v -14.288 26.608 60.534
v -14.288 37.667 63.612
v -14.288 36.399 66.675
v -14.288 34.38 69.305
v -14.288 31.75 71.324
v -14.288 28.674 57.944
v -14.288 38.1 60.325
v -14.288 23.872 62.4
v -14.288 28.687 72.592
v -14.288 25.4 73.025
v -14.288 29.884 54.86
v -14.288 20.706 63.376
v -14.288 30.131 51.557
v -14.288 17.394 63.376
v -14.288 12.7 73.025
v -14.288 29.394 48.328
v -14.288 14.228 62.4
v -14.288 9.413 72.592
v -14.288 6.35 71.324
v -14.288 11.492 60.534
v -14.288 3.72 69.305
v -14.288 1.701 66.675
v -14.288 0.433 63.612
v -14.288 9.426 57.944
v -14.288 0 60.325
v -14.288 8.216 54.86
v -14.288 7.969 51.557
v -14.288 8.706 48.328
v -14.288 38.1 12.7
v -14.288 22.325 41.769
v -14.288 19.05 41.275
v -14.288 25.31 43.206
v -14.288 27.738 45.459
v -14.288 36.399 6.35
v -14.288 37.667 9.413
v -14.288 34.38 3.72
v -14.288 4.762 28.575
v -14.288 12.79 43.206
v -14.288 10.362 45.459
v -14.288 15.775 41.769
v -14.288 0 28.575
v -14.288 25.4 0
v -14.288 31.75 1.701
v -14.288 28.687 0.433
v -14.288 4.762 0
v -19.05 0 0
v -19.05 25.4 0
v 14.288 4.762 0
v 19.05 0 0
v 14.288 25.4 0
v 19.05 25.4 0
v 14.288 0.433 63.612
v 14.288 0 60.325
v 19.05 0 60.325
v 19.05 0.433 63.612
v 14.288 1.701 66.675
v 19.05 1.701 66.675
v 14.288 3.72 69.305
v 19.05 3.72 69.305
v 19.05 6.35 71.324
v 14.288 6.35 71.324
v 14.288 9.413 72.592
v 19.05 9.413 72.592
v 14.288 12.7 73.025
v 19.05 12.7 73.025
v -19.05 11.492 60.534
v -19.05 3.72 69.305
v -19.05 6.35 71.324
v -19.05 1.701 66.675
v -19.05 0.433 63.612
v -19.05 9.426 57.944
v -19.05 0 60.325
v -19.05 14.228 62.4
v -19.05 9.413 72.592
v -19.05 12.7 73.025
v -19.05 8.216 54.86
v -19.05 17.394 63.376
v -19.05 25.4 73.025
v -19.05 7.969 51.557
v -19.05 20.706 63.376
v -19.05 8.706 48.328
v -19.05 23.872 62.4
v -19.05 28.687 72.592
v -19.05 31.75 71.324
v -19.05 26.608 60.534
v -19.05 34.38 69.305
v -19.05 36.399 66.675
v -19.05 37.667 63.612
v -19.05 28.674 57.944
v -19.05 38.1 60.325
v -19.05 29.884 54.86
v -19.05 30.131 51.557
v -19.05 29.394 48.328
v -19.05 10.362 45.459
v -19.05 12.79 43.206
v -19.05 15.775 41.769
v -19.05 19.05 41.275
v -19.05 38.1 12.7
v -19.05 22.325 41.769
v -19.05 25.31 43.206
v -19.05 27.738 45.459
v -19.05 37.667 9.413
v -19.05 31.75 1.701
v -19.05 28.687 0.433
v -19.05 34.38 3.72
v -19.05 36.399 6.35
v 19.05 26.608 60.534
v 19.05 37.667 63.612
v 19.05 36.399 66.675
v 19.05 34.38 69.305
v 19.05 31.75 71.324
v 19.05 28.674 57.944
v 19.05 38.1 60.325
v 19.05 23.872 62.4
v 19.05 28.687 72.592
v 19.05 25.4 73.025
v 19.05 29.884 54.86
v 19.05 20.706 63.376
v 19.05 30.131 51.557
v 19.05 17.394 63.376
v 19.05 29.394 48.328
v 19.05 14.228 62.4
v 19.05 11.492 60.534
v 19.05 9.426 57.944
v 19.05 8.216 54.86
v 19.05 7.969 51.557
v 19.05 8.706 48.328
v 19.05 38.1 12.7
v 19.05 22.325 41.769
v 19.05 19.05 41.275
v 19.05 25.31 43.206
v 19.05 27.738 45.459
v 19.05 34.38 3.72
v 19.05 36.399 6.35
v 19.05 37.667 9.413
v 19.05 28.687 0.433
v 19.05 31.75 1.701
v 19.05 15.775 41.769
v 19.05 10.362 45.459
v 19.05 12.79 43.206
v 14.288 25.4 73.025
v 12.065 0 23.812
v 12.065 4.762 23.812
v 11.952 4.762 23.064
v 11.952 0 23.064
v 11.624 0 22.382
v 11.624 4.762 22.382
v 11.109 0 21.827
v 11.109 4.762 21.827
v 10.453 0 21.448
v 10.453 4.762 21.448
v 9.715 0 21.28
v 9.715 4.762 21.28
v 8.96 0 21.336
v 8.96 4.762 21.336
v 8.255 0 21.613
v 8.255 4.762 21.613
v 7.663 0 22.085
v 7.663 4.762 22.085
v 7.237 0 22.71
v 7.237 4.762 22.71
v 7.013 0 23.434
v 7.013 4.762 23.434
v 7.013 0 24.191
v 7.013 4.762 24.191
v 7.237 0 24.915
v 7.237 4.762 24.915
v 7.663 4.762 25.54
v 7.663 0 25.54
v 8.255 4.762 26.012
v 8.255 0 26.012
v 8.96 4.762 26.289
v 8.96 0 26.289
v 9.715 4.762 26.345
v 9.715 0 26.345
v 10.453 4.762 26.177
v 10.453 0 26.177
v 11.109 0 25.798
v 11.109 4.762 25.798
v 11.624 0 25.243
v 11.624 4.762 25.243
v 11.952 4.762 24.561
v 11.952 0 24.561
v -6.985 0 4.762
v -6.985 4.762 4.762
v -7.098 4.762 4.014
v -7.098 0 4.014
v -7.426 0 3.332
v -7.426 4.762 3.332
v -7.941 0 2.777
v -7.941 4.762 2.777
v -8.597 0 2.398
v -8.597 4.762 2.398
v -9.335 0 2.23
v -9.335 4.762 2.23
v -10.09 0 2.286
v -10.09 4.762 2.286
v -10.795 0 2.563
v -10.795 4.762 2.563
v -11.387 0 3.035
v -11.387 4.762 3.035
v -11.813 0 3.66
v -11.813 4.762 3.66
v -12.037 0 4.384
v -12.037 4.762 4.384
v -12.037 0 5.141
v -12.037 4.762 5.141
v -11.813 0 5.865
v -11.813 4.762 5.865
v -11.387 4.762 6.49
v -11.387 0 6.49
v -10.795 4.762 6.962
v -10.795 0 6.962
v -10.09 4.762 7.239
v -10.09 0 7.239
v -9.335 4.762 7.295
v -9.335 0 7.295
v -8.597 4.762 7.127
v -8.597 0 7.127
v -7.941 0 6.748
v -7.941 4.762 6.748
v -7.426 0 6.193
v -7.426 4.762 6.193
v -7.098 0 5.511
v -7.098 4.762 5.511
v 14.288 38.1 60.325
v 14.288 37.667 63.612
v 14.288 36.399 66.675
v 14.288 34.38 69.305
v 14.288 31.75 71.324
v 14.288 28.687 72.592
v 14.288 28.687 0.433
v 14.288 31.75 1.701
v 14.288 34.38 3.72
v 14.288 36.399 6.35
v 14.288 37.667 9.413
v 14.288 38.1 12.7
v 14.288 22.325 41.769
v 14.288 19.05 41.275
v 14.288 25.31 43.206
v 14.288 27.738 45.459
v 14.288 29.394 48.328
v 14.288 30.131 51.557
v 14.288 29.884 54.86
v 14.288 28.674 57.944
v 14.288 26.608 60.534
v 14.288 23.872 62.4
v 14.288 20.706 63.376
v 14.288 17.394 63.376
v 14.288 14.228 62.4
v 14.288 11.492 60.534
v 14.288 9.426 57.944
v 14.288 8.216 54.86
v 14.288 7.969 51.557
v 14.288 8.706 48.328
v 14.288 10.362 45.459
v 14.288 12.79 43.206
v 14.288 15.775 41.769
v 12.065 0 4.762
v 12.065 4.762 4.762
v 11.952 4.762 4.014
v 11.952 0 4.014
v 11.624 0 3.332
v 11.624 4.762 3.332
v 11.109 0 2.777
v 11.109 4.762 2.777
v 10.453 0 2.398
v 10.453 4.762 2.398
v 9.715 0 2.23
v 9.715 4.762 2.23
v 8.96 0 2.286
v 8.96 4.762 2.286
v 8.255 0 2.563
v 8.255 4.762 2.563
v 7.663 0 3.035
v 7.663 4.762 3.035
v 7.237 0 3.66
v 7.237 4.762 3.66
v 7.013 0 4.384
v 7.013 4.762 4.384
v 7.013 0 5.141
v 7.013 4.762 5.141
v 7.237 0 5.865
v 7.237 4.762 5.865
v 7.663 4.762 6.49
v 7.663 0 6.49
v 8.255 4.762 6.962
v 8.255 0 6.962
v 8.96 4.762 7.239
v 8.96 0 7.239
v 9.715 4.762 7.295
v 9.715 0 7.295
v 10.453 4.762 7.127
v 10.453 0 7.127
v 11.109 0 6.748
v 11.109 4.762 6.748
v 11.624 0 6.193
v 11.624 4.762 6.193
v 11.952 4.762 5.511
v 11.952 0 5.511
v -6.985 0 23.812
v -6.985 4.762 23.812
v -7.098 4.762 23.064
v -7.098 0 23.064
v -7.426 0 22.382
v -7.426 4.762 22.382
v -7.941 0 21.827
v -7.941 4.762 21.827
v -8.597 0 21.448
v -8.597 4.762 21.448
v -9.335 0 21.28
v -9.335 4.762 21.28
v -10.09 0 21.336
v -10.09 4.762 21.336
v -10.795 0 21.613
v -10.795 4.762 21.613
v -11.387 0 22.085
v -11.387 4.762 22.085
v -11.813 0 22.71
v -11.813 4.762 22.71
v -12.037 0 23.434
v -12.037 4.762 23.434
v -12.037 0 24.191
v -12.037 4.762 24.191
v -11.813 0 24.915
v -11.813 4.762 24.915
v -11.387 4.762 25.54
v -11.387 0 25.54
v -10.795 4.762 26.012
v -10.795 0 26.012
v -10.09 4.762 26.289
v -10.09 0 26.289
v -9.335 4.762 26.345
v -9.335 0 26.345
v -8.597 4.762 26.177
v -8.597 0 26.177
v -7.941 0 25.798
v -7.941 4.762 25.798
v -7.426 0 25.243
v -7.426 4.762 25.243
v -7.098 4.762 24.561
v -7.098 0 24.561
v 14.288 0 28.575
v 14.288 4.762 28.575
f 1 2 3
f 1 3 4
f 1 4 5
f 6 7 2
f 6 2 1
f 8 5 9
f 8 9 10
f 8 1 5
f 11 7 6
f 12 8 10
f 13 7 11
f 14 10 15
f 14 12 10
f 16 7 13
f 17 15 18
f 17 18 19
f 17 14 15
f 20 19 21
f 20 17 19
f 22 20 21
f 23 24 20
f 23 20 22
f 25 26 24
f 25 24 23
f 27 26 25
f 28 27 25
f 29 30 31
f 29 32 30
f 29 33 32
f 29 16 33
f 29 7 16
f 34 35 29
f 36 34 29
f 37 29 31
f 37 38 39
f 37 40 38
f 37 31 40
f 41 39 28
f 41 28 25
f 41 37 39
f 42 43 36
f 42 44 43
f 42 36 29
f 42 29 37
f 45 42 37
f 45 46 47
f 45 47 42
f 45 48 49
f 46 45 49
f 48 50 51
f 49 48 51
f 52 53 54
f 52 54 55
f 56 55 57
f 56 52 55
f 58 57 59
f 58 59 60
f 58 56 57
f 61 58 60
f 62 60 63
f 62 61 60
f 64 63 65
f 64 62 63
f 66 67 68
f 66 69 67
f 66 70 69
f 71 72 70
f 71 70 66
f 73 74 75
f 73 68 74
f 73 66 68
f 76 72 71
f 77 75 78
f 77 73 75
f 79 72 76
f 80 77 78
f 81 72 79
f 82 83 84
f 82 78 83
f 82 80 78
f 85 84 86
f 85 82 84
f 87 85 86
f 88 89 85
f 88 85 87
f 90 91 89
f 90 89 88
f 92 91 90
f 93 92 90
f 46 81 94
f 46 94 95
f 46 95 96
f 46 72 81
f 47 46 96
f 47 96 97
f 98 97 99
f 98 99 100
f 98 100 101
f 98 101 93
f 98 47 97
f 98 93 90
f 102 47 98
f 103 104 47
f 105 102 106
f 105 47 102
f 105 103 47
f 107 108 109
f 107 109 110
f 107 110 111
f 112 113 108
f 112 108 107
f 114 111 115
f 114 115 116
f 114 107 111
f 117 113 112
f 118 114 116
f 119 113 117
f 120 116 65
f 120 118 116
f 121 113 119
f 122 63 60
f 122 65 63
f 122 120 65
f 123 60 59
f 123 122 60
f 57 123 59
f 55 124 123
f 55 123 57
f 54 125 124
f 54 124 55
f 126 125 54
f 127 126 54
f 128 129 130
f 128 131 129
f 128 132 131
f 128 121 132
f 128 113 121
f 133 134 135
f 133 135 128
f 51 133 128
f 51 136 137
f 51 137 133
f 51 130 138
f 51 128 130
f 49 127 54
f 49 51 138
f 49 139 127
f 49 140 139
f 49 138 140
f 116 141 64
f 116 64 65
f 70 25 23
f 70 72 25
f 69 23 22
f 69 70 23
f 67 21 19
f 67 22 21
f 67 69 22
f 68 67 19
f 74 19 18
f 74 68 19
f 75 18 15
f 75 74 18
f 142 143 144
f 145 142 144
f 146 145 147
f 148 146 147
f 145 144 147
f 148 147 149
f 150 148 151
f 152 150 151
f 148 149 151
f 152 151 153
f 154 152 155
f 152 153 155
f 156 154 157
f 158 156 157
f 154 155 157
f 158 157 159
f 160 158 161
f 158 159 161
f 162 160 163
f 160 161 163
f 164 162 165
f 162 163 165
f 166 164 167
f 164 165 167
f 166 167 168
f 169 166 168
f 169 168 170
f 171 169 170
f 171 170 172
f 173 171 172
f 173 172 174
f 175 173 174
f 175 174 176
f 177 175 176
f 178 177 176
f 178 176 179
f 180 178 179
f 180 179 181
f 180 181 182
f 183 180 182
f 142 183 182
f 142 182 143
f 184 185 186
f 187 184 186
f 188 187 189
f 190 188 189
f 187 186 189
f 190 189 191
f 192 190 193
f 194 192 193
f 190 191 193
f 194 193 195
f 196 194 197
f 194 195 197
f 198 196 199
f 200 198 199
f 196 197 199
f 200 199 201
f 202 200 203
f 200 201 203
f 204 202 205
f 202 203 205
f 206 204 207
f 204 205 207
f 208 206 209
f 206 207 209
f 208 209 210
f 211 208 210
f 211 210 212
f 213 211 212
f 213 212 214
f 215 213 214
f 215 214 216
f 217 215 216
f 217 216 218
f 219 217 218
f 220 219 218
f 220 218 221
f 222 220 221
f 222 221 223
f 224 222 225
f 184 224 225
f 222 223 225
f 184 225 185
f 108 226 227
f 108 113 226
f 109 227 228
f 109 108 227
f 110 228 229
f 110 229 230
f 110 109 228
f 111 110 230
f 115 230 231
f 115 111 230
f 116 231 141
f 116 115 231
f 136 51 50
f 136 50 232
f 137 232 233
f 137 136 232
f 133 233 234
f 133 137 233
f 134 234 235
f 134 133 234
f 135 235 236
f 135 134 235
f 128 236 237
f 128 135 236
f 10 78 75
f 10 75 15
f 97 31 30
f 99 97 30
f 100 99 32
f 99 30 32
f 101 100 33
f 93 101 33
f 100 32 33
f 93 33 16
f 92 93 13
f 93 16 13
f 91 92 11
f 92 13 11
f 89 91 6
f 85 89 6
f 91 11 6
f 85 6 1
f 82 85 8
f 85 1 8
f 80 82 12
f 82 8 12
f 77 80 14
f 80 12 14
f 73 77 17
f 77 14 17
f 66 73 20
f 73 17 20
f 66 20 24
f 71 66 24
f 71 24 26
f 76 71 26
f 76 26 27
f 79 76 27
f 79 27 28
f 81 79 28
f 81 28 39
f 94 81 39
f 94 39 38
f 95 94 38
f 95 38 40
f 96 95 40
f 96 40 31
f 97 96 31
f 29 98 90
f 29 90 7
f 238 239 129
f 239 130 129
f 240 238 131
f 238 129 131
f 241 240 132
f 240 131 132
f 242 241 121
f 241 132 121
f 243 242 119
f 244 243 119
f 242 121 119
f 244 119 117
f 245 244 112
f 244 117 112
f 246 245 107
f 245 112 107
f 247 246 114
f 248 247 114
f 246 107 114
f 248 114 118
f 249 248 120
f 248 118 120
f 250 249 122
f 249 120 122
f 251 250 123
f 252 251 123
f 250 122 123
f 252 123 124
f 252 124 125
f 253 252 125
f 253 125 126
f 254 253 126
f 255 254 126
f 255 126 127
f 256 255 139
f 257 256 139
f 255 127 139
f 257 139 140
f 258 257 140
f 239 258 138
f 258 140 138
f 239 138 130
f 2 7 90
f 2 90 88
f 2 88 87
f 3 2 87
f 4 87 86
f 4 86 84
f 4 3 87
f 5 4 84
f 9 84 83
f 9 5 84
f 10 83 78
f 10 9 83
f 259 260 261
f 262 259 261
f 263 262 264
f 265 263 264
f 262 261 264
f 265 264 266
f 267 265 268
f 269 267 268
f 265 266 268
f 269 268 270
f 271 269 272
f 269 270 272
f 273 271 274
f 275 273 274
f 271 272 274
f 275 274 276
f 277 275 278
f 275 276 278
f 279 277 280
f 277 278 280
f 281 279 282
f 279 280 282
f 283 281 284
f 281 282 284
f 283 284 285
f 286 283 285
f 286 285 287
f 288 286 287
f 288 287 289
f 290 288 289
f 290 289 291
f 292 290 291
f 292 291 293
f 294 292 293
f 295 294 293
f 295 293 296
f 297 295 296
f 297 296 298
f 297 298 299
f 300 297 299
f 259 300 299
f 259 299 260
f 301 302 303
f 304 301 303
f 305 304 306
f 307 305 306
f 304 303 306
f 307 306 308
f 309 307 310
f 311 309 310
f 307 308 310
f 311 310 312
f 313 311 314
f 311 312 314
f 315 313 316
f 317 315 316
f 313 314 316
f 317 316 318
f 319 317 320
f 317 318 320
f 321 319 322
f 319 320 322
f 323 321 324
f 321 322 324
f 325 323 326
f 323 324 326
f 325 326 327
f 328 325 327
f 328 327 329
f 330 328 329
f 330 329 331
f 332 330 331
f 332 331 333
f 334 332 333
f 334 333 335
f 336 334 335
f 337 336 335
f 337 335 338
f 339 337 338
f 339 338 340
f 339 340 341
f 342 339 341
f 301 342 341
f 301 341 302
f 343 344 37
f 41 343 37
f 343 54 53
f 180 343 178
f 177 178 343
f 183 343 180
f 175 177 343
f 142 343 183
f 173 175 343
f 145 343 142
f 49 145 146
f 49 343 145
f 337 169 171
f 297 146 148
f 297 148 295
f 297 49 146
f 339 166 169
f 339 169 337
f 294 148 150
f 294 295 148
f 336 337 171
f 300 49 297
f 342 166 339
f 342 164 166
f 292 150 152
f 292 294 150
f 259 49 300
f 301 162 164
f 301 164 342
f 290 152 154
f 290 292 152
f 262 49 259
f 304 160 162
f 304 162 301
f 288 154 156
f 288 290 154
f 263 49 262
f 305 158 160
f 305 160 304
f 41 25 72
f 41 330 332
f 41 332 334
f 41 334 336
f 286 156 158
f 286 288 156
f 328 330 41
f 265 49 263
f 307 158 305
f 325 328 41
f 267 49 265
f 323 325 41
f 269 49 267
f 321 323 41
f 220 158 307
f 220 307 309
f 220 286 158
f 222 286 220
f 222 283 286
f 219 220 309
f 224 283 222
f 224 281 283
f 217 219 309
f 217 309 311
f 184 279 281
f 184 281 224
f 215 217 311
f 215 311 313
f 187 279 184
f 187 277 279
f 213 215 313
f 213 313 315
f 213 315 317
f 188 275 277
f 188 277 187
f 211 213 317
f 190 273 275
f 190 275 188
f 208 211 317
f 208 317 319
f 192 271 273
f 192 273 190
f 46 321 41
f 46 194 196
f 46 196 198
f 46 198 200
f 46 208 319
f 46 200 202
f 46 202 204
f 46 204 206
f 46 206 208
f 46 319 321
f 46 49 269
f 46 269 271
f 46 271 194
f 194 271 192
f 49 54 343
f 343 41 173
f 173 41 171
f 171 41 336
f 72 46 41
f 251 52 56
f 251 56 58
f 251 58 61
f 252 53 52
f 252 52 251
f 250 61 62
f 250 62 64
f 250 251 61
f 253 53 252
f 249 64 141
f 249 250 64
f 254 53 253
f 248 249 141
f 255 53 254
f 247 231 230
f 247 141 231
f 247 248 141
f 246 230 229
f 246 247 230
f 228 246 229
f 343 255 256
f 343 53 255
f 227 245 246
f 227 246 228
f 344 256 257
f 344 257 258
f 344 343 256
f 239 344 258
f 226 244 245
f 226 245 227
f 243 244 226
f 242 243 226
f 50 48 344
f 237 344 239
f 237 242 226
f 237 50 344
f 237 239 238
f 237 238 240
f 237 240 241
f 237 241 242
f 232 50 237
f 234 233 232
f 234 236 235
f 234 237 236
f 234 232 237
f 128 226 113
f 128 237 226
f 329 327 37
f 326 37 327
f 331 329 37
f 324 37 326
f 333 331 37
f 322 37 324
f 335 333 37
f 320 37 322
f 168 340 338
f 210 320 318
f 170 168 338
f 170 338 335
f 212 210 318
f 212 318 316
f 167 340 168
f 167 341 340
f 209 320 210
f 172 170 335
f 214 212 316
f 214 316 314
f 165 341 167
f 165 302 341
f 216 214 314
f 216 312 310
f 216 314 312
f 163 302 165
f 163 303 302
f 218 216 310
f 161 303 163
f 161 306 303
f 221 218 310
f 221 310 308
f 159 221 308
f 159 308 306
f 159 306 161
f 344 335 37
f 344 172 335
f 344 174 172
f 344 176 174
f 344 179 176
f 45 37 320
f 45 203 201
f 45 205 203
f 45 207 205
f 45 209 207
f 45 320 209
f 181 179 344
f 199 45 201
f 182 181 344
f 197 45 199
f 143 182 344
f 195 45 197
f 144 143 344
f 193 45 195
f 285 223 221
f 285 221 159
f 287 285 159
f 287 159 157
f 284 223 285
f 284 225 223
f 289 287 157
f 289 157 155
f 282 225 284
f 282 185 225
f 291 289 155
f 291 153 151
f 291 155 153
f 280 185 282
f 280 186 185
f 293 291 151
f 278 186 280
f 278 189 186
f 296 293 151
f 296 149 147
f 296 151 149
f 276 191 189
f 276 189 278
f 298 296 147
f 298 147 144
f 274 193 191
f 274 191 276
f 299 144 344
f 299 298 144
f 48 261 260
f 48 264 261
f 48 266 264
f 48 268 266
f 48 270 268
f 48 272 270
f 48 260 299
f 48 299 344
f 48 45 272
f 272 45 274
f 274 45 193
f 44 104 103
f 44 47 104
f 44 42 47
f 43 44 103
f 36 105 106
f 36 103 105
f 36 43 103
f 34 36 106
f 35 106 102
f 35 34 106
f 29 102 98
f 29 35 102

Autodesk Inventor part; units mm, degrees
ref_plane "YZ Plane" through (0, 0, 0) normal (1, 0, 0) x (0, 1, 0)
ref_plane "XZ Plane" through (0, 0, 0) normal (0, 1, 0) x (-1, 0, 0)
ref_plane "XY Plane" through (0, 0, 0) normal (0, 0, 1) x (1, 0, 0)
sketch "Sketch1" plane through (0, 0, 0) normal (0, 0, 1) x (1, 0, 0)
  line L0 (-19.05, 38.1) -> (-14.2875, 38.1)
  line L1 (-14.2875, 38.1) -> (-14.2875, 4.7625)
  line L2 (-14.2875, 4.7625) -> (14.2875, 4.7625)
  line L3 (14.2875, 4.7625) -> (14.2875, 38.1)
  line L4 (14.2875, 38.1) -> (19.05, 38.1)
  line L5 (19.05, 38.1) -> (19.05, 0)
  line L6 (19.05, 0) -> (-19.05, 0)
  line L7 (-19.05, 0) -> (-19.05, 38.1)
  line L8 (0, 0) -> (0, 4.7625) construction
  dimension "d0" = 4.7625
  dimension "d2" = 38.1
  dimension "d3" = 38.1
extrude "Extrusion1" add sketch "Sketch1" along normal blind 73.025
sketch "Sketch2" plane through (-14.2875, 4.7625, 0) normal (0, 1, 0) x (1, 0, 0)
  line L0 (23.8125, -23.8125) -> (4.7625, -23.8125) construction
  line L1 (4.7625, -23.8125) -> (4.7625, -4.7625) construction
  line L2 (4.7625, -4.7625) -> (23.8125, -4.7625) construction
  line L3 (23.8125, -4.7625) -> (23.8125, -23.8125) construction
  line L4 (23.8125, -23.8125) -> (4.7625, -4.7625) construction
  line L5 (4.7625, -23.8125) -> (23.8125, -4.7625) construction
  circle A0 centre (4.7625, -4.7625) radius 2.54
  circle A1 centre (4.7625, -23.8125) radius 2.54
  circle A2 centre (23.8125, -4.7625) radius 2.54
  circle A3 centre (23.8125, -23.8125) radius 2.54
  line L6 (0, 0) -> (0, -73.025) projected
  line L7 (28.575, 0) -> (28.575, -73.025) projected
  line L8 (0, -73.025) -> (28.575, -73.025)
  line L9 (28.575, -73.025) -> (28.575, -28.575)
  line L10 (28.575, -28.575) -> (0, -28.575)
  line L11 (0, -28.575) -> (0, -73.025)
  line L12 (14.2875, -4.7625) -> (14.2875, 0) construction
  point P0 (14.2875, -14.2875)
  dimension "d6" = 5.08
  dimension "d7" = 19.05
  dimension "d8" = 19.05
  dimension "d10" = 14.2875
  dimension "d21" = 4.7625
  dimension "d22" = 4.7625
extrude "Extrusion2" cut sketch "Sketch2" against normal through all
sketch "Sketch3" plane through (19.05, 0, 0) normal (1, 0, 0) x (0, 0, -1)
  circle A0 centre (-52.3875, 19.05) radius 11.1125
  circle A1 centre (-52.3875, 19.05) radius 9.525 construction
  line L0 (-42.8625, 19.05) -> (-42.8625, -6.9181) construction
  line L1 (0, 0) -> (-73.025, 0) construction
  dimension "d15" = 19.05
  dimension "d13" = 22.225
  dimension "d14" = 19.05
  dimension "d16" = 42.8625
extrude "Extrusion3" cut sketch "Sketch3" against normal through all
fillet "Fillet1" radius 12.7 6 edges at (16.6687, 38.1, 73.025) (-16.6687, 38.1, 73.025) (16.6687, 38.1, 0) (-16.6687, 38.1, 0) (-16.6688, 0, 73.025) (16.6688, 0, 73.025)
properties part number "top pully bracket 2" material "Aluminum 6061"
